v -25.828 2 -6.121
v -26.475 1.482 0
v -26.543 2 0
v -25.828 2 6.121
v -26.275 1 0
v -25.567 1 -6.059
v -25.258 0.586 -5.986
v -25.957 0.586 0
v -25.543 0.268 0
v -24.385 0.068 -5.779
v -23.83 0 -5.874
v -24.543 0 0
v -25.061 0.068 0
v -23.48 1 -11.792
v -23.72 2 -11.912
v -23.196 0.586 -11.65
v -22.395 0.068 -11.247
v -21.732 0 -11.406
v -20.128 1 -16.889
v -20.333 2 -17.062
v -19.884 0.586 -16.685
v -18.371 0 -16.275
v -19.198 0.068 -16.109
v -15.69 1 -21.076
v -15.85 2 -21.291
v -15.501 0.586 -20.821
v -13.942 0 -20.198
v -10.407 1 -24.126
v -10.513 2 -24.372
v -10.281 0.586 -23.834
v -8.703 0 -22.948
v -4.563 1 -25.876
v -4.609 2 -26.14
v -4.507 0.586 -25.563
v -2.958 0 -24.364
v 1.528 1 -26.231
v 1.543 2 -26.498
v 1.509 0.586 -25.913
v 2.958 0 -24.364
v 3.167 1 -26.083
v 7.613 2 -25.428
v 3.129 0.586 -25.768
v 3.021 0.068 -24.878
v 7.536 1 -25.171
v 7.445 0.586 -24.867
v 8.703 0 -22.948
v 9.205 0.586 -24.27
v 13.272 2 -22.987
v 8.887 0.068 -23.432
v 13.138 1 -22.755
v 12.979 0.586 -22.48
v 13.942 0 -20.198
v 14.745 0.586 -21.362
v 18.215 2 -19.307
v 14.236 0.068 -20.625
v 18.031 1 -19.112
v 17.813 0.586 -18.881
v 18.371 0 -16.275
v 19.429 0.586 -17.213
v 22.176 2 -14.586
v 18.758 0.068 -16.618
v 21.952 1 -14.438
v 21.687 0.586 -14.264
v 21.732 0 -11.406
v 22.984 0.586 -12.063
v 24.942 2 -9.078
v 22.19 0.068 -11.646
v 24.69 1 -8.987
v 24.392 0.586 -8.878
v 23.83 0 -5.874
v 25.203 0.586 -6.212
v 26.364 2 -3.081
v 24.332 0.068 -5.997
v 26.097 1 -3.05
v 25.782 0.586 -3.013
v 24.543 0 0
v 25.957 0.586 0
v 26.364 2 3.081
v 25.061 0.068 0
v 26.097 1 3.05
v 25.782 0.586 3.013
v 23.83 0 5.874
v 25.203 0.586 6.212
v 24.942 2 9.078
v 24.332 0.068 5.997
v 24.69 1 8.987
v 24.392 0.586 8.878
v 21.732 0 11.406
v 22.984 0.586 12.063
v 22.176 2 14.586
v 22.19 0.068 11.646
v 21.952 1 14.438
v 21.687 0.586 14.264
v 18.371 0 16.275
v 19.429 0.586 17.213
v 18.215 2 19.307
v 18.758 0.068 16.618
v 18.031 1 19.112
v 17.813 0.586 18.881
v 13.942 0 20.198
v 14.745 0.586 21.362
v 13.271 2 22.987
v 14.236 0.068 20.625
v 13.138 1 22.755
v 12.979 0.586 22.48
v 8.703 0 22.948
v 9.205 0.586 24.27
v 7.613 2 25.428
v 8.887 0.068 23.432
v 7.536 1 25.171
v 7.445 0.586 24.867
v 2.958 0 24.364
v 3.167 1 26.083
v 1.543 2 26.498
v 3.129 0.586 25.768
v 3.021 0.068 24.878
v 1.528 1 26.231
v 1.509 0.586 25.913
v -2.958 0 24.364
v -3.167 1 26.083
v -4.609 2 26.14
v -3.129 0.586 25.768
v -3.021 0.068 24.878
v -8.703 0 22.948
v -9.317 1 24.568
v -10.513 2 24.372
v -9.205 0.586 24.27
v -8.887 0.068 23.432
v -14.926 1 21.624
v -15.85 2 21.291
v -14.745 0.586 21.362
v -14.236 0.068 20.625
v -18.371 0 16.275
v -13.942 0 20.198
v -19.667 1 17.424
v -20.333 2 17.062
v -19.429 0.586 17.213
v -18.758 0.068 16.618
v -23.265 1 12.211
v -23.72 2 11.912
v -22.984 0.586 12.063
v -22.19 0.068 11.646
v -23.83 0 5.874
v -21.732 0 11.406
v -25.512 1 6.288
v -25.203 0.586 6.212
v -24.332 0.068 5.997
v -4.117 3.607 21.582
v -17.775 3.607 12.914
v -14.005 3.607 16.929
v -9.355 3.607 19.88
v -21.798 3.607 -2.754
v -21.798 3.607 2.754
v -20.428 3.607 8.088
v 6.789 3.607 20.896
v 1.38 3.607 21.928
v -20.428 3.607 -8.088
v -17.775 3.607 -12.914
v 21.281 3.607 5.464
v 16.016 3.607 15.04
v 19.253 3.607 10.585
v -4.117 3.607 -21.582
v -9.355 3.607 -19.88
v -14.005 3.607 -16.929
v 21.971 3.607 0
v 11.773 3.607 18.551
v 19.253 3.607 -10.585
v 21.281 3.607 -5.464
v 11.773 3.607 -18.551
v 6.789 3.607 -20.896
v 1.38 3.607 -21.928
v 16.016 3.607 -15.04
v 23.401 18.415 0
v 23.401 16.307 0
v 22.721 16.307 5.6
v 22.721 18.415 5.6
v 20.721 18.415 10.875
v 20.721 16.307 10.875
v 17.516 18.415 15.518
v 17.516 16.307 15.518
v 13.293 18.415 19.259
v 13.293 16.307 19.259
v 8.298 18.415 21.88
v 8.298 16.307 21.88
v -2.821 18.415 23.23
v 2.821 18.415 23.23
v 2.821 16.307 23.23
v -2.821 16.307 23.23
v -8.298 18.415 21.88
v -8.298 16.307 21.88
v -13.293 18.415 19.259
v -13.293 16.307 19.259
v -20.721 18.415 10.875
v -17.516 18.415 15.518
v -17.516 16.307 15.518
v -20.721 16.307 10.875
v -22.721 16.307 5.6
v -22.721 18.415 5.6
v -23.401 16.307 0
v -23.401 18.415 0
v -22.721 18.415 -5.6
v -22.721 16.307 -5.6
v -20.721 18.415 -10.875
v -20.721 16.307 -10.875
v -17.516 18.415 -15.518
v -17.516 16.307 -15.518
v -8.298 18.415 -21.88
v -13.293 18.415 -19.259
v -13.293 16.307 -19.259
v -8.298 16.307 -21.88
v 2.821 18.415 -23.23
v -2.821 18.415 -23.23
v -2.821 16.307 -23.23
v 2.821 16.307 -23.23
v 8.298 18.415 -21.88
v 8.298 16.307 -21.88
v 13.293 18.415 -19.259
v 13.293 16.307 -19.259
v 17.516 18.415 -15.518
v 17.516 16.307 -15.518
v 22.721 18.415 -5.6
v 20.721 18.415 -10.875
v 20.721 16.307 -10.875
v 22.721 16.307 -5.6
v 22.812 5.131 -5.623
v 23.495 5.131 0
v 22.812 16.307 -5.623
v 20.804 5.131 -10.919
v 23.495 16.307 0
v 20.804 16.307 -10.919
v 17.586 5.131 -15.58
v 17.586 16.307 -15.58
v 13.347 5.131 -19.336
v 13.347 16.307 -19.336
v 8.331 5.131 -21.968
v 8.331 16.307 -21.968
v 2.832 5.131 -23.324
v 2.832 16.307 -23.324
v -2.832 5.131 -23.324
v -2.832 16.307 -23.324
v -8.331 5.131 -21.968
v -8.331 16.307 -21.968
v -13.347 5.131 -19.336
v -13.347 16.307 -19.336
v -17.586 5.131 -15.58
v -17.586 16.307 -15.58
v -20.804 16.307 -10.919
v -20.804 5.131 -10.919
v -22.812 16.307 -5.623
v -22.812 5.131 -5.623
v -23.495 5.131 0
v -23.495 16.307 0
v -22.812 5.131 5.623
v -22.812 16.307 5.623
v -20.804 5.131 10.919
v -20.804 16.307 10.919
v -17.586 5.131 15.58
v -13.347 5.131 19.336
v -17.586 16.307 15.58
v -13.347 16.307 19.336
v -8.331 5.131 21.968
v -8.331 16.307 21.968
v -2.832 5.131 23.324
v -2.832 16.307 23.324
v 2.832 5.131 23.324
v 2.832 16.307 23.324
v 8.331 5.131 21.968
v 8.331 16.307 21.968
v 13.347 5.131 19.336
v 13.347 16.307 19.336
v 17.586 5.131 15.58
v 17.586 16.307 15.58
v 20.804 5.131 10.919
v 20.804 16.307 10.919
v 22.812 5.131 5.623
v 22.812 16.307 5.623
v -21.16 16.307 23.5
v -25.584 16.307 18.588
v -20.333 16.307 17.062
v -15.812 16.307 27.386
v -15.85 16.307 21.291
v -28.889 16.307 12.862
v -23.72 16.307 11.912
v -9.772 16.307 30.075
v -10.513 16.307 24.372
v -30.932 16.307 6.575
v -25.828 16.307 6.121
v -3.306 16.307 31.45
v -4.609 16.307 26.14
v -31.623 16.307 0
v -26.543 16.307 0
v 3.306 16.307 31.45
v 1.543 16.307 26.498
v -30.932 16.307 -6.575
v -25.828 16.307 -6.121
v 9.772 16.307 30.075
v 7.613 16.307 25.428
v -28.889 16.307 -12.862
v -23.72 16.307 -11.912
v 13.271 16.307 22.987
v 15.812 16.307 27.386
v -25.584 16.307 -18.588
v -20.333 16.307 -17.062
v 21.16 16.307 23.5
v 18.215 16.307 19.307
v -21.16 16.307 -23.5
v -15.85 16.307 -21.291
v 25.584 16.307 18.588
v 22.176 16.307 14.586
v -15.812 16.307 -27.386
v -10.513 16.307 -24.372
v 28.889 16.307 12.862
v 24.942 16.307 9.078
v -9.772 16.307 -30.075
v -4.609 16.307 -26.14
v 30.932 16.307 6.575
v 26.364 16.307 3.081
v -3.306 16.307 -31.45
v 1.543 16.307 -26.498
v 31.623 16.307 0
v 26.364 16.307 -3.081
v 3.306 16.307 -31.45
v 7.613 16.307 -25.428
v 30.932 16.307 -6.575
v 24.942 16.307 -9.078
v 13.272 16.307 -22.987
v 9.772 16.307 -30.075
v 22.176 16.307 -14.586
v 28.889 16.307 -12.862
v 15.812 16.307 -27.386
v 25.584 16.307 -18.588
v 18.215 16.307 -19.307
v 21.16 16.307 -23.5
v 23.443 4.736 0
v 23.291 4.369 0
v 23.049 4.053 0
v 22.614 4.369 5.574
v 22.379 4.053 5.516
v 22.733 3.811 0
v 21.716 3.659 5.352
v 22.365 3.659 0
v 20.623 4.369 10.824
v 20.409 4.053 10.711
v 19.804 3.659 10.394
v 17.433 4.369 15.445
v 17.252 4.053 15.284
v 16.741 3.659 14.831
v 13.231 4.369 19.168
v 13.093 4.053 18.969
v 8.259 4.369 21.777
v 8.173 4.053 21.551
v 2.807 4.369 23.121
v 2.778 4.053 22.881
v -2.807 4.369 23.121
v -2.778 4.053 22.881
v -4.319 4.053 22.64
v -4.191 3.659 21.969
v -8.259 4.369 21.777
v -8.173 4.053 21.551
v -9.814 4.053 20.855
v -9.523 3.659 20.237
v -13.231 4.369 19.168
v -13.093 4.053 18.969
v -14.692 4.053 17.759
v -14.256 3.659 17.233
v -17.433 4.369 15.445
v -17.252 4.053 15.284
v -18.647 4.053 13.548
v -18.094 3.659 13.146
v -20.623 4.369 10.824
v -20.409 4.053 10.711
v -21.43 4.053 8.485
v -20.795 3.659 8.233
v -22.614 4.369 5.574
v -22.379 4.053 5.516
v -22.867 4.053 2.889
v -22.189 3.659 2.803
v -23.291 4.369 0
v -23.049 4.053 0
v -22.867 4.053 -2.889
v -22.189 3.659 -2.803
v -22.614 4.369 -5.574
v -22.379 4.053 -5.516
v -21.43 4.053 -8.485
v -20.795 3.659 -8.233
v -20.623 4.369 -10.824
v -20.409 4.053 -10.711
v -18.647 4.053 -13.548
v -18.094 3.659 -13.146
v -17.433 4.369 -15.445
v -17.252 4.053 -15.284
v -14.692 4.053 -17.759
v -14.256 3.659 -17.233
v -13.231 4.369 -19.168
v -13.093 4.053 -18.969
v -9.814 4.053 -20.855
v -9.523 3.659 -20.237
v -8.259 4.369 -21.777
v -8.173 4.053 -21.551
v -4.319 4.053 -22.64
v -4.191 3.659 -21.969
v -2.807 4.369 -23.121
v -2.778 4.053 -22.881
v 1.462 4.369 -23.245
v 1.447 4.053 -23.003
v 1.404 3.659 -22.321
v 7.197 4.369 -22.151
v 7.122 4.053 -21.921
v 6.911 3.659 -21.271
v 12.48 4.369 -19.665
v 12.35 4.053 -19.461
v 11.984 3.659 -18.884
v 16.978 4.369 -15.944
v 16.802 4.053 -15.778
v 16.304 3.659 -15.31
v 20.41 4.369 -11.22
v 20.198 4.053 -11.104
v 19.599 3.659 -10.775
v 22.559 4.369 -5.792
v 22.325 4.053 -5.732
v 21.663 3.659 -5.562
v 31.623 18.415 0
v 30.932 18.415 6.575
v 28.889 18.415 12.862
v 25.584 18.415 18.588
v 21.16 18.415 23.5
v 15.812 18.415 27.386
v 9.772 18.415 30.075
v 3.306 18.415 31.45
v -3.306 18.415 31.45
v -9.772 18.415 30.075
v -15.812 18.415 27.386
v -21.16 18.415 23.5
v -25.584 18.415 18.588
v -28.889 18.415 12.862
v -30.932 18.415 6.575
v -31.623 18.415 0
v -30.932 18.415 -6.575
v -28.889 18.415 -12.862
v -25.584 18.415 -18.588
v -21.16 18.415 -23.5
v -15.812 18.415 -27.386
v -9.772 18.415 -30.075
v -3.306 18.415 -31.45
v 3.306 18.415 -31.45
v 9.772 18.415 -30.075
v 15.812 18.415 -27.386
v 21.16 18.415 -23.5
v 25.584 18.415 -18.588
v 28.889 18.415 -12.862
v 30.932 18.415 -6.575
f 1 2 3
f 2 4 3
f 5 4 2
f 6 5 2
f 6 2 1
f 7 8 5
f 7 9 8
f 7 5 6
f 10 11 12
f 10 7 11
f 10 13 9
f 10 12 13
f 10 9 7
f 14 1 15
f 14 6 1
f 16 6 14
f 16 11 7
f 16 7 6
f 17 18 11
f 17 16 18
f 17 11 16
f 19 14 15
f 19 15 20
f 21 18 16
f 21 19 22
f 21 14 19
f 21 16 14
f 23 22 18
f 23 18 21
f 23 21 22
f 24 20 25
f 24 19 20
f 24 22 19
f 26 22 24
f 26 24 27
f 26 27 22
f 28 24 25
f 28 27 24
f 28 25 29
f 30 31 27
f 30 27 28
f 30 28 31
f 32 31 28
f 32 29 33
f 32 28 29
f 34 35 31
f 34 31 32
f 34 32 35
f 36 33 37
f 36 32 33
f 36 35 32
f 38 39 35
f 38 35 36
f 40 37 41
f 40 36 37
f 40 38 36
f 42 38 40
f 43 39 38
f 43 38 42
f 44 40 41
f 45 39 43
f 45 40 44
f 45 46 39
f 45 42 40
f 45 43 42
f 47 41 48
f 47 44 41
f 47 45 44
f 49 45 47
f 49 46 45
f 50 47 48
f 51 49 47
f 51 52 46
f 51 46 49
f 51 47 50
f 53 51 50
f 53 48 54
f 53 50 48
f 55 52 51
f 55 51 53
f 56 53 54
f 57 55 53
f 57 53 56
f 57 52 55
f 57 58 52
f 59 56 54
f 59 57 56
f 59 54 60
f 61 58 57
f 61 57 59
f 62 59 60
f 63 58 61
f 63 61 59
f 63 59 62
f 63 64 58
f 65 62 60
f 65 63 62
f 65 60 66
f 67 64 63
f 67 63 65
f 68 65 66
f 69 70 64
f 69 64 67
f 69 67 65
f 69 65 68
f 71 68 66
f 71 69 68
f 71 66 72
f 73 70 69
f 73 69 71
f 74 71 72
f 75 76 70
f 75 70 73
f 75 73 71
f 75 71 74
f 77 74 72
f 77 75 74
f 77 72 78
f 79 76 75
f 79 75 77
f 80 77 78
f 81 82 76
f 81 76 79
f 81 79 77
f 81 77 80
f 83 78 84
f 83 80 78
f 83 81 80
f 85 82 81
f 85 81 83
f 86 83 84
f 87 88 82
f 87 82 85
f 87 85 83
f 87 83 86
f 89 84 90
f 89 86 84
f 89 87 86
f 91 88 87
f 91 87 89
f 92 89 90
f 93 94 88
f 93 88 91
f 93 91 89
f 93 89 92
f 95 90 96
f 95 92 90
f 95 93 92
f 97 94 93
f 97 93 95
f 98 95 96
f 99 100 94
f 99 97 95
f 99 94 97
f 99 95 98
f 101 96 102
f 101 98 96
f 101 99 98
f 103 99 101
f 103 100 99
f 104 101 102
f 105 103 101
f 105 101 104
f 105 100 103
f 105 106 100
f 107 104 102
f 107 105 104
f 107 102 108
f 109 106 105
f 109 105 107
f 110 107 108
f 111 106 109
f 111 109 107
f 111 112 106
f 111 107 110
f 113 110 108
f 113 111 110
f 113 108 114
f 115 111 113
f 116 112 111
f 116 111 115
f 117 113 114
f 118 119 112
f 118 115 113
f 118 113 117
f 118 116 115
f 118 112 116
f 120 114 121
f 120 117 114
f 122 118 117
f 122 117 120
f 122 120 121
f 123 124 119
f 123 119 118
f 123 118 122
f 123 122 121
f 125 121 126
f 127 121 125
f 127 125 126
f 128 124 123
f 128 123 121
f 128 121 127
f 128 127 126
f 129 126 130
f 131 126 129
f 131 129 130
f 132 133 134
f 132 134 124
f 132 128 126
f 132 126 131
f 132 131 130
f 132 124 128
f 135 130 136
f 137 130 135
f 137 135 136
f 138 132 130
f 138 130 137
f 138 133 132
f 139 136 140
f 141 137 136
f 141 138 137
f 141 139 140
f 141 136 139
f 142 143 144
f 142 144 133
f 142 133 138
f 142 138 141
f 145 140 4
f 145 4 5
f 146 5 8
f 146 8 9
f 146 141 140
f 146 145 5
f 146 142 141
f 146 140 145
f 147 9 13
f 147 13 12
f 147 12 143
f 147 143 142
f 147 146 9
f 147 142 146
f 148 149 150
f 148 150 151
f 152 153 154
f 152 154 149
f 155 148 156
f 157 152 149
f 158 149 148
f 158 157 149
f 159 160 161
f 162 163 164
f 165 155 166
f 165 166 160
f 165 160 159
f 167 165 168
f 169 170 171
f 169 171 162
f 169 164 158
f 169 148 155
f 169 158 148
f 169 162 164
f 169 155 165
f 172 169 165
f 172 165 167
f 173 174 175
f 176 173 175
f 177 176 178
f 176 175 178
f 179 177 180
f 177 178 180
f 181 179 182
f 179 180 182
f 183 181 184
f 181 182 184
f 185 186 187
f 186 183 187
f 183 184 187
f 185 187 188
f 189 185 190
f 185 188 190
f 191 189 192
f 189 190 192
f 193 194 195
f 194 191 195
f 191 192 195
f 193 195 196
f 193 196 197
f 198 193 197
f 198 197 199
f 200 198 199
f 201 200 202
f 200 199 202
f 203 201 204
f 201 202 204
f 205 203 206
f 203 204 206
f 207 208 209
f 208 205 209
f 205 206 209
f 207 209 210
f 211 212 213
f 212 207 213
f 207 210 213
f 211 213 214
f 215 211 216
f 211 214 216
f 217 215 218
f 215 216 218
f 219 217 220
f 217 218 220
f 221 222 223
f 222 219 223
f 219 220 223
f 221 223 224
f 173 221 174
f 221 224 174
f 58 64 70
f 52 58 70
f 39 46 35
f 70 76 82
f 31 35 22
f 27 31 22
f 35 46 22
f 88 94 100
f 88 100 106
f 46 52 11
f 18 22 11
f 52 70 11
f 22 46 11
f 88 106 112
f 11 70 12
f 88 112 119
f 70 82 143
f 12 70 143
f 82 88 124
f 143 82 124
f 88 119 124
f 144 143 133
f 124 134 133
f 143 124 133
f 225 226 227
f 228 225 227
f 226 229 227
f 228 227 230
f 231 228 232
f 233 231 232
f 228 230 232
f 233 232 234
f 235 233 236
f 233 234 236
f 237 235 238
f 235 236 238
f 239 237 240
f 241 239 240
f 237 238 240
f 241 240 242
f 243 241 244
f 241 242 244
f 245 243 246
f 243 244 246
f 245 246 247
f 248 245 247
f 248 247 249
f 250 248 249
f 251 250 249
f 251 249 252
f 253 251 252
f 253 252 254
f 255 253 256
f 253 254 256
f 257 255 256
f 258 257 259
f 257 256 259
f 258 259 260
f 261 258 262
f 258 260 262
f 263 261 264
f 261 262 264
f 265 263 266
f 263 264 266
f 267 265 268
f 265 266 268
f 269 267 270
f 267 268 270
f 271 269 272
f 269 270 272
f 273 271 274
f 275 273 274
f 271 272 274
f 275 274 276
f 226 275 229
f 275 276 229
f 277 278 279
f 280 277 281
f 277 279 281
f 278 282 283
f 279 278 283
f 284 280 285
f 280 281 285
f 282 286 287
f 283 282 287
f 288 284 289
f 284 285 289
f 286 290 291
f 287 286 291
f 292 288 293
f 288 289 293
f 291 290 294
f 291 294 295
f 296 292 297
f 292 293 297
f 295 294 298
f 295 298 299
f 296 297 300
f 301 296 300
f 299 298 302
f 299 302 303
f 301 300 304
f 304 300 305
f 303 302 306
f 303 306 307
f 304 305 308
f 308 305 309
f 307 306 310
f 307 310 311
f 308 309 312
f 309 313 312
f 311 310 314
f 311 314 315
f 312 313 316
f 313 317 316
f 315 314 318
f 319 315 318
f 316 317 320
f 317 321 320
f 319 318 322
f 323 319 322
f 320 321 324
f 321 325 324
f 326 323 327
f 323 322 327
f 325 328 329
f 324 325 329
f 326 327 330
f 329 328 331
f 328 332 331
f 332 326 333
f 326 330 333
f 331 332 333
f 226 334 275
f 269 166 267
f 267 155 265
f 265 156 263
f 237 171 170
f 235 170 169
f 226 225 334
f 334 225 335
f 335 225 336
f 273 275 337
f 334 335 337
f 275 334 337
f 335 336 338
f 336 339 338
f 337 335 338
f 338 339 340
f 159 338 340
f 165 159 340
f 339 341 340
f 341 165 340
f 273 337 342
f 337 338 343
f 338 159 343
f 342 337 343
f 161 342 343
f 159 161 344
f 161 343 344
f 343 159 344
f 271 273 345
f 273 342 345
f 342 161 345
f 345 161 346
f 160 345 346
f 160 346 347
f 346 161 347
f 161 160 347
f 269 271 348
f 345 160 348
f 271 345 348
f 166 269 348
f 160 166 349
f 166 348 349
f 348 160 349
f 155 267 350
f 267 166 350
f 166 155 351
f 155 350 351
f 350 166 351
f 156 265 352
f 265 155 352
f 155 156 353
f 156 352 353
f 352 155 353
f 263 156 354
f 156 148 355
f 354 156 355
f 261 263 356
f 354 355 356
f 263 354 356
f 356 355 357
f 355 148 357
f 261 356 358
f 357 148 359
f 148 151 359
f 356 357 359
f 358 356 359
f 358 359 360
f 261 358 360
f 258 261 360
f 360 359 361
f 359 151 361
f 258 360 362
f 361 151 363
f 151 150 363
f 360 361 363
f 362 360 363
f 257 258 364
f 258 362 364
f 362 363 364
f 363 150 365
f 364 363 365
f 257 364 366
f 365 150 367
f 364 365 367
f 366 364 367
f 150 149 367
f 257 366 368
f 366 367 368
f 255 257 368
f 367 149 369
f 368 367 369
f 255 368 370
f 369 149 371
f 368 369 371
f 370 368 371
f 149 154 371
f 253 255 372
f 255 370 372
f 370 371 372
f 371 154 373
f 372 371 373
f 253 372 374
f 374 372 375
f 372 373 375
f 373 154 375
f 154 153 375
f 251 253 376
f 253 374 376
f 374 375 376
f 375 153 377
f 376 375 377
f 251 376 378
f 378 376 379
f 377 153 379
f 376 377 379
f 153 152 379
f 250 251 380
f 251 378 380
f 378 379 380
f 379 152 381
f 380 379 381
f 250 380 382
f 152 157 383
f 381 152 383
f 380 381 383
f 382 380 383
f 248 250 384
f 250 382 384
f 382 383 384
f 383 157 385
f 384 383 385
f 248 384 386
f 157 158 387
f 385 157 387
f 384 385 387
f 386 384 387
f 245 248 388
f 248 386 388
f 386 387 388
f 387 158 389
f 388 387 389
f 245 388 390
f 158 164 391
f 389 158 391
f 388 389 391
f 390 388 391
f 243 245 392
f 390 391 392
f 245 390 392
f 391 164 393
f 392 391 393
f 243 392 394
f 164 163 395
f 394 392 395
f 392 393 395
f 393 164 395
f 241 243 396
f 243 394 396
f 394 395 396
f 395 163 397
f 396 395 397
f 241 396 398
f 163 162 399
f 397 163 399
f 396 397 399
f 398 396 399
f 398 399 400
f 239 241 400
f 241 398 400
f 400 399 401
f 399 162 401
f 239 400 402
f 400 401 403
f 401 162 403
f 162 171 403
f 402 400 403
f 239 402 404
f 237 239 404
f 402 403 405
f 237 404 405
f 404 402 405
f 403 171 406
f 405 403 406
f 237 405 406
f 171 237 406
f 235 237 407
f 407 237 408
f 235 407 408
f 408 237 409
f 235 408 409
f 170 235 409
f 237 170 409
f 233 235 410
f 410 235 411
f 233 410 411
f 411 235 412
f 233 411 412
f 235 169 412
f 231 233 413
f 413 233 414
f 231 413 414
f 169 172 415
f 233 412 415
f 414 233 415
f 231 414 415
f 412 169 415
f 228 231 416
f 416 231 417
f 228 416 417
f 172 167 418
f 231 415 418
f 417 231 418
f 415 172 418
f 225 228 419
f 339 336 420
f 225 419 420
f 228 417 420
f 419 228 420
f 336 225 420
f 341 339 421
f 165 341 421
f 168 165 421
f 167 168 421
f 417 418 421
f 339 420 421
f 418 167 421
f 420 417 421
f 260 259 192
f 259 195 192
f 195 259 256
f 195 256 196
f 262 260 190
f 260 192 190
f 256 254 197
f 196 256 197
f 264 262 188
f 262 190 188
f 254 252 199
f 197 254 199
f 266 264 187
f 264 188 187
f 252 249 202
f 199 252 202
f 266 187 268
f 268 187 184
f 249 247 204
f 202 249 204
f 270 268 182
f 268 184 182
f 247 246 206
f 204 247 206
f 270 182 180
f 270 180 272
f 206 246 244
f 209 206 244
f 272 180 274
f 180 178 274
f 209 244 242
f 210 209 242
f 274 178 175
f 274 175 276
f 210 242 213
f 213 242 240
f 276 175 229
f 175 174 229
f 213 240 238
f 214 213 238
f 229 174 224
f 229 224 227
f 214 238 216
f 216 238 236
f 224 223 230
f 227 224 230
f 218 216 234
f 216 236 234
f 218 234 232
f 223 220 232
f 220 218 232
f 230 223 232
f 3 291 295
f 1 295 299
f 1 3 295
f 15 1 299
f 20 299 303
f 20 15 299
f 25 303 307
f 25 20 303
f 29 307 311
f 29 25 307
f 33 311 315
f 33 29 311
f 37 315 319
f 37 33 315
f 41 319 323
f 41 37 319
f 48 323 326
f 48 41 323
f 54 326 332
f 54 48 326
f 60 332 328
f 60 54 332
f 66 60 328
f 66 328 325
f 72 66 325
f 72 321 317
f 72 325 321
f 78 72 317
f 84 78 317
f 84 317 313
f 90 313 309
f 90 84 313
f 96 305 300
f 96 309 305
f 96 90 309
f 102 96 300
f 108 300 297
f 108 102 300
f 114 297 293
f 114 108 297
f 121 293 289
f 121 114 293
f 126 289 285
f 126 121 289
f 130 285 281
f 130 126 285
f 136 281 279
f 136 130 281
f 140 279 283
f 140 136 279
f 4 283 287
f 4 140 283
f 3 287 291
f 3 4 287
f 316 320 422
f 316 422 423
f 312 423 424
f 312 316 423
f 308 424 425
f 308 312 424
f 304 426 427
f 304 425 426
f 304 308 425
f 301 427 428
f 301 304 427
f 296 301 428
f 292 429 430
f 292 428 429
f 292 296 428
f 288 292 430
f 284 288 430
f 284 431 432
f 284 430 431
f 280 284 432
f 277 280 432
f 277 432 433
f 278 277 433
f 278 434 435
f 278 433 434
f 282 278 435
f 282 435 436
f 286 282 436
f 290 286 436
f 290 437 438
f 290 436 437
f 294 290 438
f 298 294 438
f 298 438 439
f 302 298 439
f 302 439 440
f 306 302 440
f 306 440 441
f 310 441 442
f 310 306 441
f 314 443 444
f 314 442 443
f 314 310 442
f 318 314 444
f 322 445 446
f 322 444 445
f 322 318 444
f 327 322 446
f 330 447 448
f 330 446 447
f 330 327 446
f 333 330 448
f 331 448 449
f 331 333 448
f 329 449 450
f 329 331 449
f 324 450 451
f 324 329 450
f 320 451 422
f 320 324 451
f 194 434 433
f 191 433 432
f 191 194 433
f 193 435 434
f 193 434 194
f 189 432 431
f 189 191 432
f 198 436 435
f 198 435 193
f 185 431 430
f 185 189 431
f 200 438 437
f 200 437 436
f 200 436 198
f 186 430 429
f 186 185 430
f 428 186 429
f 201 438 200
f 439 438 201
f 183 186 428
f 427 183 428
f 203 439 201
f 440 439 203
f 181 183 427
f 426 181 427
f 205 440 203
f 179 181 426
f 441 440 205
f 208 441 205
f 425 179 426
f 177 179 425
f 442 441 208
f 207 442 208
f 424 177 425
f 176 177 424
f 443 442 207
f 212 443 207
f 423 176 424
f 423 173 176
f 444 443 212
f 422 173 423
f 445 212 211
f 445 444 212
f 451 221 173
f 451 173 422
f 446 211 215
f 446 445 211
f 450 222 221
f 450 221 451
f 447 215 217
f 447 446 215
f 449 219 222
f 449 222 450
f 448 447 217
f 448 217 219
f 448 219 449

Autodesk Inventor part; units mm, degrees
ref_plane "YZ Plane" through (0, 0, 0) normal (1, 0, 0) x (0, 1, 0)
ref_plane "XZ Plane" through (0, 0, 0) normal (0, 1, 0) x (-1, 0, 0)
ref_plane "XY Plane" through (0, 0, 0) normal (0, 0, 1) x (1, 0, 0)
sketch "Sketch1" plane through (0, 0, 0) normal (0, 1, 0) x (-1, 0, 0)
  circle A0 centre (0, 0) radius 26.543
  dimension "d0" = 53.086
extrude "Extrusion1" add sketch "Sketch1" along normal blind 16.3068
sketch "Sketch2" plane through (0, 16.3068, 0) normal (0, 1, 0) x (1, 0, 0)
  circle A0 centre (0, 0) radius 23.495
  dimension "d3" = 46.99
extrude "Extrusion2" cut sketch "Sketch2" against normal blind 12.7
sketch "Sketch3" plane through (0, 16.3068, 0) normal (0, 1, 0) x (1, 0, 0)
  circle A0 centre (0, 0) radius 31.623
  circle A1 centre (0, 0) radius 23.401
  dimension "d6" = 63.246
extrude "Extrusion4" add sketch "Sketch3" along normal blind 2.1082
fillet "Fillet2" radius 1.524 1 edges at (-23.495, 3.6068, 0)
fillet "Fillet3" radius 2 1 edges at (26.543, 0, 0)
properties part number "_3DPrint"
